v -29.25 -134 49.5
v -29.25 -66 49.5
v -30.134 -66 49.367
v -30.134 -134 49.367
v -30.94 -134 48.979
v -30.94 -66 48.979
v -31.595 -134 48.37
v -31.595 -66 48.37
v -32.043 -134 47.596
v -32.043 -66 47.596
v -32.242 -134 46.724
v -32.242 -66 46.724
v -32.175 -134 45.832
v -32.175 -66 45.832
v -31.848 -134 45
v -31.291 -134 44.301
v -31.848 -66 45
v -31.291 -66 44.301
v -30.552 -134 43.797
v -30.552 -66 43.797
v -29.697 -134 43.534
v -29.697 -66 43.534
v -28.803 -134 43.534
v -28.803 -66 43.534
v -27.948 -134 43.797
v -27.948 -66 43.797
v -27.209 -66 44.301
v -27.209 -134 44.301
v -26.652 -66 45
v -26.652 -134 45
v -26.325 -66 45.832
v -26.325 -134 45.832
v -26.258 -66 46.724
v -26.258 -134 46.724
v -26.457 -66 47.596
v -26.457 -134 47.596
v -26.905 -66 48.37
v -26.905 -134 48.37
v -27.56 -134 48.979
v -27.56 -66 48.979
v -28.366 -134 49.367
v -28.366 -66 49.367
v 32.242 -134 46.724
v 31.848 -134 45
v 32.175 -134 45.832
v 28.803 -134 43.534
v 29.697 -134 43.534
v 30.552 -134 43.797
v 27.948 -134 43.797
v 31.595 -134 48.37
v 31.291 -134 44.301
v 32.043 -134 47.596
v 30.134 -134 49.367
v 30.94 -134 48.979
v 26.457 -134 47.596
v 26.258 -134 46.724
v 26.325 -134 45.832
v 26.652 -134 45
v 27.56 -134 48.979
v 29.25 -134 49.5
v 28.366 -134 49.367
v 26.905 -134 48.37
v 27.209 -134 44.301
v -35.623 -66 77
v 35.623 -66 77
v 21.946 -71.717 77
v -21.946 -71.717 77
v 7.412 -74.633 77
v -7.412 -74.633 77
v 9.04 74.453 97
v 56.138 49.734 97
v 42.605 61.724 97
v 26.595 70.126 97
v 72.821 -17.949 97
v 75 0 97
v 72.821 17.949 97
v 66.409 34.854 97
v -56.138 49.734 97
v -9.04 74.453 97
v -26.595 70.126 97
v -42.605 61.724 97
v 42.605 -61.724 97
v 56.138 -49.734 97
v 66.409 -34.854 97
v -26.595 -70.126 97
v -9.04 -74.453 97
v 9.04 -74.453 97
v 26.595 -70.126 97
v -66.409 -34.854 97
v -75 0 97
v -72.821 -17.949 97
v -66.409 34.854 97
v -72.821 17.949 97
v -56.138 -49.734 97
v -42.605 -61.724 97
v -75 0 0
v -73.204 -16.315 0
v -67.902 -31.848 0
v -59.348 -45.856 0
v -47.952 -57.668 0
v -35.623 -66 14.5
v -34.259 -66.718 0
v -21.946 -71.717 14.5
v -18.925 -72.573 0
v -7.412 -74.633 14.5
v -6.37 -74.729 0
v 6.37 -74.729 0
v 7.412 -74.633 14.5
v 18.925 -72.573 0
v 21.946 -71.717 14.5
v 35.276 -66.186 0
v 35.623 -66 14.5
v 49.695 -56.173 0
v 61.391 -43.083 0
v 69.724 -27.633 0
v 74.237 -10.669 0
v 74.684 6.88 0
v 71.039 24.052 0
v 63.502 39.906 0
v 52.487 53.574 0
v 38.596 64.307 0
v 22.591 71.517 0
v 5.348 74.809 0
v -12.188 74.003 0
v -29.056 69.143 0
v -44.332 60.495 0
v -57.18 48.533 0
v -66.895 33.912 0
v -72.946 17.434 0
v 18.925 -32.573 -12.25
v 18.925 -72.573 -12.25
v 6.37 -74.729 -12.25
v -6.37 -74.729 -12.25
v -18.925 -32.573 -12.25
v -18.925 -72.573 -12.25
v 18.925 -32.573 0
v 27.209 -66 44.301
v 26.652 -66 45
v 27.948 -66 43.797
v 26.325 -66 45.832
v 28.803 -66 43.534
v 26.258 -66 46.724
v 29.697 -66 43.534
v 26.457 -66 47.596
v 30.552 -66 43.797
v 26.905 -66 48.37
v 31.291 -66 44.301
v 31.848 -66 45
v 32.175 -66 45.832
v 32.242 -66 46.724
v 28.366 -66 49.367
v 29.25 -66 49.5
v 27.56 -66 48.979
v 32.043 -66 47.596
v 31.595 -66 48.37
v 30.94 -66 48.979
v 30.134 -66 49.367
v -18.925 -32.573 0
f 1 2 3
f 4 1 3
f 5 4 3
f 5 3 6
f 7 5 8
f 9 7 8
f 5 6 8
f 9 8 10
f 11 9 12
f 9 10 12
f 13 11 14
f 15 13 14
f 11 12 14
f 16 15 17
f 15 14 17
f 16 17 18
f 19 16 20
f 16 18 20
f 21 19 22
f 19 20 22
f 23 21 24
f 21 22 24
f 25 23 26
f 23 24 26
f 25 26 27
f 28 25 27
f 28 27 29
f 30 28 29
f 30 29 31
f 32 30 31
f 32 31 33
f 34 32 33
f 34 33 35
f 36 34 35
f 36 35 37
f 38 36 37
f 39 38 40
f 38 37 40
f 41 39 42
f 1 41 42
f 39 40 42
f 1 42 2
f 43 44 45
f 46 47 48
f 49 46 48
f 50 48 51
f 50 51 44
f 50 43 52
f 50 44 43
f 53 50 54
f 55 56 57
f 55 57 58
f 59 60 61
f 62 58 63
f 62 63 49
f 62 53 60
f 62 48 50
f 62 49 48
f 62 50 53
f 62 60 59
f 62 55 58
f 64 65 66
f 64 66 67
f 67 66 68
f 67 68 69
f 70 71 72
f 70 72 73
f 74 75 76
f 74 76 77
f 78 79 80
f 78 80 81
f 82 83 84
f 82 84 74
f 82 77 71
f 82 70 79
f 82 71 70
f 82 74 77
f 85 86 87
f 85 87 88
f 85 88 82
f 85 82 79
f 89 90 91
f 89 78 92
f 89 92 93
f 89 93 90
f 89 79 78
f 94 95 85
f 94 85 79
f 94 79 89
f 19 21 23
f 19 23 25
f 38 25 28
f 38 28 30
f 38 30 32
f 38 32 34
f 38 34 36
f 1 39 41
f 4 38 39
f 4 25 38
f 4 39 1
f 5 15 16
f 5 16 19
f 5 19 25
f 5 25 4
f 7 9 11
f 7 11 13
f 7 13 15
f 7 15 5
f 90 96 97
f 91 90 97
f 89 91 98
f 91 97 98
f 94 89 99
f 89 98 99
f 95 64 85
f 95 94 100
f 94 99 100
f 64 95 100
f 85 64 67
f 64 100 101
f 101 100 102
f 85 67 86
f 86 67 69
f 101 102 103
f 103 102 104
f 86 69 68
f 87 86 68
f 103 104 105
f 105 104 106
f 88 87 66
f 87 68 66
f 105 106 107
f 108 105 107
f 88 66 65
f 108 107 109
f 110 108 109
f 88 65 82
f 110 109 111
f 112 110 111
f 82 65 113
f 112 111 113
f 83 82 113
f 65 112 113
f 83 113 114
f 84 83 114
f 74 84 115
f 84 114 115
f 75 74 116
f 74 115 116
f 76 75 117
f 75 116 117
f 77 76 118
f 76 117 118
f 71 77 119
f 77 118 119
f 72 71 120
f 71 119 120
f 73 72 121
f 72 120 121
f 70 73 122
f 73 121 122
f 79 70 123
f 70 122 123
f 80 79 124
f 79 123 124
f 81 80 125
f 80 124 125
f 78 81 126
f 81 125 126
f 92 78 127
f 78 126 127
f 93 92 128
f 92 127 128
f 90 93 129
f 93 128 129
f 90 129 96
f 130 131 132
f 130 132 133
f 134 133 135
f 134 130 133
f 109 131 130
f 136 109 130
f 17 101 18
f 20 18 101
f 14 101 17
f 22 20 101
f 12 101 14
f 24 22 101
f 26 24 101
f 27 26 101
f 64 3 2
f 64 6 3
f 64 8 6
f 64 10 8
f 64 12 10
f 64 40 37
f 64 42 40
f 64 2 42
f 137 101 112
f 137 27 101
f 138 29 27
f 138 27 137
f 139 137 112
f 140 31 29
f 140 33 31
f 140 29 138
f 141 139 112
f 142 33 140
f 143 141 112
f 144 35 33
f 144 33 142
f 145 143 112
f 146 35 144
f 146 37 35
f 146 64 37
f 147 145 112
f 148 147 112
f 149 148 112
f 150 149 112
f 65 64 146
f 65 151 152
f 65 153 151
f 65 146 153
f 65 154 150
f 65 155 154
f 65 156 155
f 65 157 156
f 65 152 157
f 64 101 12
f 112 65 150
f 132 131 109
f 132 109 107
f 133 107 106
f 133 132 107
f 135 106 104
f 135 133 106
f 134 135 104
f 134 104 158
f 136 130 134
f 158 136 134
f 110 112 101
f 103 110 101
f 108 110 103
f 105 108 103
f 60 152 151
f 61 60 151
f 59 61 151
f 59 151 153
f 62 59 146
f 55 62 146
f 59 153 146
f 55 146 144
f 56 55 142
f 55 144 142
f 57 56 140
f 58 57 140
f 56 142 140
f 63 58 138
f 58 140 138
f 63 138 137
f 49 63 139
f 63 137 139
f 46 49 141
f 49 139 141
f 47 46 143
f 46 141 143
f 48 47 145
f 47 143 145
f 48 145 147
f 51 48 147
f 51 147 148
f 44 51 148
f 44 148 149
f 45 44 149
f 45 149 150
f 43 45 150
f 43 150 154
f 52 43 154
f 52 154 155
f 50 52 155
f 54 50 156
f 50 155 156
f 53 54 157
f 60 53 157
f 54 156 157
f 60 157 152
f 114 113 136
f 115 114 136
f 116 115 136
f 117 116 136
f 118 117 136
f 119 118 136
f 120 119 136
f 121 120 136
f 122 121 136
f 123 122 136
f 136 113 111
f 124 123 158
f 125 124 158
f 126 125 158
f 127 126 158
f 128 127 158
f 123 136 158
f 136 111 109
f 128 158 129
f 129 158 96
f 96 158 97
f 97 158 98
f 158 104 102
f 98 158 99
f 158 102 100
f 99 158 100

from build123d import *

# Parameters (mm, degrees)
SKETCH1_R           = 75
BOSS_EXTRUDE1_DEPTH = 97
CUT_EXTRUDE1_START  = -62.5
CUT_EXTRUDE1_DEPTH  = 62.5
SKETCH3_R           = 3
BOSS_EXTRUDE2_DEPTH = 68
BOSS_EXTRUDE3_START = 12.25
SKETCH4_W           = 37.85
SKETCH4_H           = 40
BOSS_EXTRUDE3_DEPTH = 12.25


with BuildPart() as part:
    # Sketch1 → Boss-Extrude1 (new body)
    with BuildSketch(Plane.XY):
        with Locations(Location((0, 0, 0), (0, 0, 180))):
            Circle(SKETCH1_R)
    extrude(amount=BOSS_EXTRUDE1_DEPTH)

    # Sketch2 → Cut-Extrude1 (cut)
    with BuildSketch(Plane(origin=(0, 0, 14.5), x_dir=(-1, 0, 0), z_dir=(0, 0, -1)).offset(CUT_EXTRUDE1_START)):
        Polygon((404.05546865, -66), (35.623026261, -66), (-35.623026261, -66), (-404.05546865, -66), (-404.05546865, -802.864884777), (404.05546865, -802.864884777), align=None)
    extrude(amount=CUT_EXTRUDE1_DEPTH, mode=Mode.SUBTRACT)

    # Sketch3 → Boss-Extrude2 (add)
    with BuildSketch(Plane.XZ.offset(66)):
        with Locations(Location((-29.25, 46.5, 0), (0, 0, 90))):
            Circle(SKETCH3_R)
        with Locations(Location((29.25, 46.5, 0), (0, 0, 90))):
            Circle(SKETCH3_R)
    extrude(amount=BOSS_EXTRUDE2_DEPTH)

    # Sketch4 → Boss-Extrude3 (add)
    with BuildSketch(Plane(origin=(0, 0, 0), x_dir=(-1, 0, 0), z_dir=(0, 0, -1)).offset(BOSS_EXTRUDE3_START)):
        with Locations((0, -52.573027875)):
            Rectangle(SKETCH4_W, SKETCH4_H)
        with BuildLine():
            Line((18.925, -72.573027875), (-18.925, -72.573027875))
            ThreePointArc((-18.925, -72.573027875), (0, -75), (18.925, -72.573027875))
        make_face()
    extrude(amount=-BOSS_EXTRUDE3_DEPTH)


solid = part.part
